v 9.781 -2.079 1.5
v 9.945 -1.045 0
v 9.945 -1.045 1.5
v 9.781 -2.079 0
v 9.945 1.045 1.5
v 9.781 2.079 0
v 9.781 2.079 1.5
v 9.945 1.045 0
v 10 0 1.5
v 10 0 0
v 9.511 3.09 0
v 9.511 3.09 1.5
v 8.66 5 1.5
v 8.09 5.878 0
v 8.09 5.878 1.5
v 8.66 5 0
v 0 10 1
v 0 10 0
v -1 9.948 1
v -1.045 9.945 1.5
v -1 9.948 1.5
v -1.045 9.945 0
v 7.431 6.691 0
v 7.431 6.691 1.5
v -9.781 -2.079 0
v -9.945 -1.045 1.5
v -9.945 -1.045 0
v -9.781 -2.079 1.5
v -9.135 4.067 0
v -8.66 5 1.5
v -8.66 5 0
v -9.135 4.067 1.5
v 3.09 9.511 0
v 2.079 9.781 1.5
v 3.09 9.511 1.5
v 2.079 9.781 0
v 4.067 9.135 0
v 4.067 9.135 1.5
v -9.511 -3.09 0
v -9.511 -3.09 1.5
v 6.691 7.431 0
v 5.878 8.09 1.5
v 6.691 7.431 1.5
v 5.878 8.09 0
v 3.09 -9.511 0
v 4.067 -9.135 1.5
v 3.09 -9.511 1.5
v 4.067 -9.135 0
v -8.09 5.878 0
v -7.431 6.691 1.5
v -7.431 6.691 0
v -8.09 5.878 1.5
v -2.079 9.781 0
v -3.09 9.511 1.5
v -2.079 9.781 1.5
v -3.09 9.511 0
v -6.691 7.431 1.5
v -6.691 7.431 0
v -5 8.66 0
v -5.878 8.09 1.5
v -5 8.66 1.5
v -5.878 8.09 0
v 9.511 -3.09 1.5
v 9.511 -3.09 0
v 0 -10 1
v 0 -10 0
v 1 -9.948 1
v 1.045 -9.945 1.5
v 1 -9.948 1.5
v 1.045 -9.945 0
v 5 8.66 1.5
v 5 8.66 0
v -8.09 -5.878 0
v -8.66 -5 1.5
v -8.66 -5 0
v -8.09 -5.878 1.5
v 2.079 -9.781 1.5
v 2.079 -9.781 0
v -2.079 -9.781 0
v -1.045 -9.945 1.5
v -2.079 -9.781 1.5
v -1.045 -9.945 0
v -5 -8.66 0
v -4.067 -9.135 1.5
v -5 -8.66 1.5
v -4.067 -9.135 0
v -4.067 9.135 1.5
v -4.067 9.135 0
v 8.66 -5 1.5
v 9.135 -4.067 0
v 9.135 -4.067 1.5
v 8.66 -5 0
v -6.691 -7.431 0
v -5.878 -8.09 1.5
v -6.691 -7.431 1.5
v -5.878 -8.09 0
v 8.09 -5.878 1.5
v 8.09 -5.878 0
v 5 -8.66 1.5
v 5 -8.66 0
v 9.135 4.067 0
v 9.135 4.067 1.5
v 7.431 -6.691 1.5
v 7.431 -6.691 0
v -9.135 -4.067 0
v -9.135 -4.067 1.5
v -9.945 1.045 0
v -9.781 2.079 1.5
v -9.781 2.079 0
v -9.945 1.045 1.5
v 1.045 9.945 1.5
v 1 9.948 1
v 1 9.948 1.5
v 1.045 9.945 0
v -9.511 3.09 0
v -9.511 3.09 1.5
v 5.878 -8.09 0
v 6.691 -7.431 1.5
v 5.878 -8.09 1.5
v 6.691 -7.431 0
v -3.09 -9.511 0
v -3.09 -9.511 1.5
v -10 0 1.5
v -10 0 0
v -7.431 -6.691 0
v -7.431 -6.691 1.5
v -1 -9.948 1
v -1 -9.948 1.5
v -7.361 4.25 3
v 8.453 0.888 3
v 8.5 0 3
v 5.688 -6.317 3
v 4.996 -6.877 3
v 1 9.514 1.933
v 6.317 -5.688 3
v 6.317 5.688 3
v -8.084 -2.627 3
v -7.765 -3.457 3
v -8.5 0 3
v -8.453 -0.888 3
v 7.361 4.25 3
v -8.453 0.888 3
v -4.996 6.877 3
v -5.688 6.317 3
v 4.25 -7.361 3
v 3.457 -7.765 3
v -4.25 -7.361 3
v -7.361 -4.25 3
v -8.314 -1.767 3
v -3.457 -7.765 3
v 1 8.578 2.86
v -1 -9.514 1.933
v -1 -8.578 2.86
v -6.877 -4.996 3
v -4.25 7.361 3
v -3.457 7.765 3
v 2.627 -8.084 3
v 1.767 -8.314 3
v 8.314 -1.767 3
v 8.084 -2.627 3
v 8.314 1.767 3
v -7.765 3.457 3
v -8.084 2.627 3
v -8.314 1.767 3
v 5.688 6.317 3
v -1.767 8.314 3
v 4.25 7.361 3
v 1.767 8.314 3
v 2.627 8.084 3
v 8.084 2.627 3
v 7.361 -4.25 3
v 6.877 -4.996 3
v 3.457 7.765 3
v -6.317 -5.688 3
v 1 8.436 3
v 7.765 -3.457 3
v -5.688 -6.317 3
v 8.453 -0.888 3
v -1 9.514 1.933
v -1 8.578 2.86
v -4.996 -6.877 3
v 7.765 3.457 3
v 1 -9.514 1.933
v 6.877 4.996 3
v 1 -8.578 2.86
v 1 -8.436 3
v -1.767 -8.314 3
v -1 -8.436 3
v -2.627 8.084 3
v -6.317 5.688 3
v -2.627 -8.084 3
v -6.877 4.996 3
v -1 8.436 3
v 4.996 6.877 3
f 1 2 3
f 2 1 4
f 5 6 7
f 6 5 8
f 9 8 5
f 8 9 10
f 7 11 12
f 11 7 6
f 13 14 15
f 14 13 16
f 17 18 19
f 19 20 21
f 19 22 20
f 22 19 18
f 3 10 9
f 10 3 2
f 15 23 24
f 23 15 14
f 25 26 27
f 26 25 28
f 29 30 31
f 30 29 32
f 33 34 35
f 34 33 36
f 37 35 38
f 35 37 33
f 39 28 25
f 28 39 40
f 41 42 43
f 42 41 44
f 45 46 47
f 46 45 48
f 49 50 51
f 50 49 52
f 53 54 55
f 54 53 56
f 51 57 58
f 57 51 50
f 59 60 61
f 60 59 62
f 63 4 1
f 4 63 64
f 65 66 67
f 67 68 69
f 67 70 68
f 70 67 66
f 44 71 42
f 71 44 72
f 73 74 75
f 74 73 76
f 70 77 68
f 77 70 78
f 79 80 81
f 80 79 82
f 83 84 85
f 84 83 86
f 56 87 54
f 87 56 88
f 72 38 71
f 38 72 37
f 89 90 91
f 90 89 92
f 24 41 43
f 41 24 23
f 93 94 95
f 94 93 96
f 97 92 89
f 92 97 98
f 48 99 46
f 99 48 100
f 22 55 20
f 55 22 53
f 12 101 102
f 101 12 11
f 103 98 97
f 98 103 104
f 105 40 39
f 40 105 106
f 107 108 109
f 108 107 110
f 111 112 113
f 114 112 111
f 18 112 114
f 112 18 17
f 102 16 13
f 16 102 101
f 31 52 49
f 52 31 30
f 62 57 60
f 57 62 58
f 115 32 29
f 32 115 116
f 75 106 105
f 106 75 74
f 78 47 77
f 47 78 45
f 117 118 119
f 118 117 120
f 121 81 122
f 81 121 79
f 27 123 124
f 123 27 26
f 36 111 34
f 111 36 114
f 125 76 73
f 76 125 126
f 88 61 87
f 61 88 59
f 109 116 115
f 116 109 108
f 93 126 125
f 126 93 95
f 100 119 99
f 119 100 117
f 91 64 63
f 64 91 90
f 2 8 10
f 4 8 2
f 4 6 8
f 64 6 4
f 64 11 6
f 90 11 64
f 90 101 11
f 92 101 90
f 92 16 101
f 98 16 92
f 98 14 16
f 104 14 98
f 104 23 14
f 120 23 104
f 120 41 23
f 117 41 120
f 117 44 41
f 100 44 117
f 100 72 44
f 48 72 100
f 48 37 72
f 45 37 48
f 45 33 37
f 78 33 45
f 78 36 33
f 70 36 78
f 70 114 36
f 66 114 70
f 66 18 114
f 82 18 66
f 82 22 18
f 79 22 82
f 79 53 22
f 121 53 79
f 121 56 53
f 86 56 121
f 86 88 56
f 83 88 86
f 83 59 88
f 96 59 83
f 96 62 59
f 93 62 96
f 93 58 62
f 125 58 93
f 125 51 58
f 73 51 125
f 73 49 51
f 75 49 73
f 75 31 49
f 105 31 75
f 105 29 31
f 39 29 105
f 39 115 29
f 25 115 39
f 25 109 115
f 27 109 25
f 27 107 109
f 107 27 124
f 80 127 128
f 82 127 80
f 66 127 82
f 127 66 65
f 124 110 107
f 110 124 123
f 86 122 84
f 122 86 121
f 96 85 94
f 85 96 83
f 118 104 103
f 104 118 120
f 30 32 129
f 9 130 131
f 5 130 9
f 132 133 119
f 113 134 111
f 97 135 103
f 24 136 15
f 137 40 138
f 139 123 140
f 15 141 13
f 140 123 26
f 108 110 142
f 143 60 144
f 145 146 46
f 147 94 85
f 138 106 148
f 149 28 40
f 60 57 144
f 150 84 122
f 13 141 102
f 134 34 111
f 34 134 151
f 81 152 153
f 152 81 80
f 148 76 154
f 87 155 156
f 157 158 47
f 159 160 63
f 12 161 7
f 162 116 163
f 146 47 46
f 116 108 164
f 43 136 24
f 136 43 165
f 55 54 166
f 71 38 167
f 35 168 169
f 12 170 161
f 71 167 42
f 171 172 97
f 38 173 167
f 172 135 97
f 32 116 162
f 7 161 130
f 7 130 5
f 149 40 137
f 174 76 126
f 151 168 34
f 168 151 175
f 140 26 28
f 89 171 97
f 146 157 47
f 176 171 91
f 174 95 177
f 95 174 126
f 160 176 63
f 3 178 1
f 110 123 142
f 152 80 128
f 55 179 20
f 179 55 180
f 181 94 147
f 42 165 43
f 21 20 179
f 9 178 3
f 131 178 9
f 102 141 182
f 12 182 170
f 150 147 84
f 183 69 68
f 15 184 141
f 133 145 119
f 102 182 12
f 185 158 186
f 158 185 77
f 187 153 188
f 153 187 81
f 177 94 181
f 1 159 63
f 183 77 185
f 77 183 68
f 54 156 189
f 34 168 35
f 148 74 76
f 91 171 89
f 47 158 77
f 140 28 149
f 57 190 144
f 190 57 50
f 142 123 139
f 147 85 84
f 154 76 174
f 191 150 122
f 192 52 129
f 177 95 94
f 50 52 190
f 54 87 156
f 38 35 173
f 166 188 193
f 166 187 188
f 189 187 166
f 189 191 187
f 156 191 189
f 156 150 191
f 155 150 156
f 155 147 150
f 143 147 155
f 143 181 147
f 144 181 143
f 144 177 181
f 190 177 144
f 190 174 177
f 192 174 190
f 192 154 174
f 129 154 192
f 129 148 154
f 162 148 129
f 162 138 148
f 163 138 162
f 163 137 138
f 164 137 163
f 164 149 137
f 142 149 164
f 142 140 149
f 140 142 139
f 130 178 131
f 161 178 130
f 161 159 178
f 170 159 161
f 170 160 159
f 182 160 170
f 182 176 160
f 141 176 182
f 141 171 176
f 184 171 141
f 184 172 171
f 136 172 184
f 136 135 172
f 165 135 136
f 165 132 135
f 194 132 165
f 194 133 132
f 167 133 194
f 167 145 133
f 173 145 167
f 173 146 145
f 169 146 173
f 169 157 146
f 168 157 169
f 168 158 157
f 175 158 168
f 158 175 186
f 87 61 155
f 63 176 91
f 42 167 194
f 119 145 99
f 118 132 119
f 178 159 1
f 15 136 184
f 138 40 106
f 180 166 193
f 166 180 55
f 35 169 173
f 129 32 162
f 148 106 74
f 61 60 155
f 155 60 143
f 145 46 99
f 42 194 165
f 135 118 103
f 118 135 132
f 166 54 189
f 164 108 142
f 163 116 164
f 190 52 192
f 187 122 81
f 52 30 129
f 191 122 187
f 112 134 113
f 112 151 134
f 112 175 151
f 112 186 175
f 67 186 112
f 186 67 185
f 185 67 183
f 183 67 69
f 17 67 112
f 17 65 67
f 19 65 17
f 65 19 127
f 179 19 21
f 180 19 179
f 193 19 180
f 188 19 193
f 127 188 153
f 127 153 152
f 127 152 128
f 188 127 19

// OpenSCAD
// Title: Mini Base
// Author: http://www.thingiverse.com/Jinja
// Date: 29/12/2016

/////////// START OF PARAMETERS /////////////////


base_diam = 20; // [10:Tiny, 20:Medium, 40:Large, 60:Huge: 80:Gargantuan]
slot_width = 2;
//base_diam = 20;
//base_diam = 10;
multi_slots = 0; // [1:MultiSlots, 0:SingleSlot]

base_or_mini = 0; // [0:Base, 1:Mini]

//silhouette_filename = "minibase40_bear.dat"; // [image_surface:100x100]
//silhouette_filename = "minibase40_spider.dat"; // [image_surface:100x100]
//silhouette_filename = "minibase40_wolf.dat"; // [image_surface:100x100]
//silhouette_filename = "minibase40_warhorse.dat"; // [image_surface:100x100]
//silhouette_filename = "minibase40_tiger.dat"; // [image_surface:100x100]
silhouette_filename = "minibase40_halfling.dat"; // [image_surface:100x100]

silhouette_scale = 1.0; // warhorse 40
//silhouette_scale = 0.7; // bear 20
//silhouette_scale = 1.2; // bear 40
//silhouette_scale = 1.0; // spider 40
//silhouette_scale = 0.5; // spider 20
//silhouette_scale = 0.3; // spider 10
//silhouette_scale = 1.4; // wolf 40
//silhouette_scale = 0.7; // wolf 20
//silhouette_scale = 1.2; // tiger 40
//silhouette_scale = 0.65; // tiger 20
//silhouette_scale = 0.6; // halfling 20


/////////// END OF PARAMETERS /////////////////
rounded = 1*1;    // the mm width of the bevelled edge

$fs=0.3*1;
$fa=6*1; //smooth
//$fa=20; //rough
pi = 3.1415927 * 1.0;

silhouette_width = 0.3*6.0; // 

if(base_or_mini==0)
{
    Base(base_diam);
}
else
{
    //translate([-1,0,3])
    //rotate([90,0,90])
    Silhouette(silhouette_width);
}

module Silhouette(width)
{
    scale([silhouette_scale,silhouette_scale,width/2.0])
    
    intersection()
    {
        translate([0,0,-15])
        scale([0.5,0.5,30])
        surface(file=silhouette_filename);
        
        cube([150,150,2.0]);
    }
    
    //translate([0,0,1.03])
    //union()
    //{
    //    Image();
    //    scale([1,1,-1])    
    //    Image();
    //}
}

module Image()
{
    difference()
    {
        translate([0,0,-0.03])
        scale([0.5,0.5,1])
        surface(file=silhouette_filename);
        translate([-2,-2,-2])
        cube([150,150,2]);        
    }
    
}



module Base(base_diam)
{
	card = 0.0;
	rad=base_diam/2.0;
    difference()
    {
        union()
        {
            cylinder( 1.5, rad, rad );
            translate( [0,0,1.5] )
            cylinder( 1.5, rad, rad-1.5 );
        }
        if(multi_slots==0)
        {
            Slit(base_diam);
        }
        else
        {
            count=floor(((base_diam/2)-4) / (2*slot_width));
            for (i = [-count : 1 : count]) 
            {
                x=i*2*slot_width;
                translate([x,0,0])
                Slit(base_diam);
            }
        }
    }
}

module Slit(base_diam)
{
    translate([0,0,2.5])
    cube([slot_width,base_diam,3],true);
}
